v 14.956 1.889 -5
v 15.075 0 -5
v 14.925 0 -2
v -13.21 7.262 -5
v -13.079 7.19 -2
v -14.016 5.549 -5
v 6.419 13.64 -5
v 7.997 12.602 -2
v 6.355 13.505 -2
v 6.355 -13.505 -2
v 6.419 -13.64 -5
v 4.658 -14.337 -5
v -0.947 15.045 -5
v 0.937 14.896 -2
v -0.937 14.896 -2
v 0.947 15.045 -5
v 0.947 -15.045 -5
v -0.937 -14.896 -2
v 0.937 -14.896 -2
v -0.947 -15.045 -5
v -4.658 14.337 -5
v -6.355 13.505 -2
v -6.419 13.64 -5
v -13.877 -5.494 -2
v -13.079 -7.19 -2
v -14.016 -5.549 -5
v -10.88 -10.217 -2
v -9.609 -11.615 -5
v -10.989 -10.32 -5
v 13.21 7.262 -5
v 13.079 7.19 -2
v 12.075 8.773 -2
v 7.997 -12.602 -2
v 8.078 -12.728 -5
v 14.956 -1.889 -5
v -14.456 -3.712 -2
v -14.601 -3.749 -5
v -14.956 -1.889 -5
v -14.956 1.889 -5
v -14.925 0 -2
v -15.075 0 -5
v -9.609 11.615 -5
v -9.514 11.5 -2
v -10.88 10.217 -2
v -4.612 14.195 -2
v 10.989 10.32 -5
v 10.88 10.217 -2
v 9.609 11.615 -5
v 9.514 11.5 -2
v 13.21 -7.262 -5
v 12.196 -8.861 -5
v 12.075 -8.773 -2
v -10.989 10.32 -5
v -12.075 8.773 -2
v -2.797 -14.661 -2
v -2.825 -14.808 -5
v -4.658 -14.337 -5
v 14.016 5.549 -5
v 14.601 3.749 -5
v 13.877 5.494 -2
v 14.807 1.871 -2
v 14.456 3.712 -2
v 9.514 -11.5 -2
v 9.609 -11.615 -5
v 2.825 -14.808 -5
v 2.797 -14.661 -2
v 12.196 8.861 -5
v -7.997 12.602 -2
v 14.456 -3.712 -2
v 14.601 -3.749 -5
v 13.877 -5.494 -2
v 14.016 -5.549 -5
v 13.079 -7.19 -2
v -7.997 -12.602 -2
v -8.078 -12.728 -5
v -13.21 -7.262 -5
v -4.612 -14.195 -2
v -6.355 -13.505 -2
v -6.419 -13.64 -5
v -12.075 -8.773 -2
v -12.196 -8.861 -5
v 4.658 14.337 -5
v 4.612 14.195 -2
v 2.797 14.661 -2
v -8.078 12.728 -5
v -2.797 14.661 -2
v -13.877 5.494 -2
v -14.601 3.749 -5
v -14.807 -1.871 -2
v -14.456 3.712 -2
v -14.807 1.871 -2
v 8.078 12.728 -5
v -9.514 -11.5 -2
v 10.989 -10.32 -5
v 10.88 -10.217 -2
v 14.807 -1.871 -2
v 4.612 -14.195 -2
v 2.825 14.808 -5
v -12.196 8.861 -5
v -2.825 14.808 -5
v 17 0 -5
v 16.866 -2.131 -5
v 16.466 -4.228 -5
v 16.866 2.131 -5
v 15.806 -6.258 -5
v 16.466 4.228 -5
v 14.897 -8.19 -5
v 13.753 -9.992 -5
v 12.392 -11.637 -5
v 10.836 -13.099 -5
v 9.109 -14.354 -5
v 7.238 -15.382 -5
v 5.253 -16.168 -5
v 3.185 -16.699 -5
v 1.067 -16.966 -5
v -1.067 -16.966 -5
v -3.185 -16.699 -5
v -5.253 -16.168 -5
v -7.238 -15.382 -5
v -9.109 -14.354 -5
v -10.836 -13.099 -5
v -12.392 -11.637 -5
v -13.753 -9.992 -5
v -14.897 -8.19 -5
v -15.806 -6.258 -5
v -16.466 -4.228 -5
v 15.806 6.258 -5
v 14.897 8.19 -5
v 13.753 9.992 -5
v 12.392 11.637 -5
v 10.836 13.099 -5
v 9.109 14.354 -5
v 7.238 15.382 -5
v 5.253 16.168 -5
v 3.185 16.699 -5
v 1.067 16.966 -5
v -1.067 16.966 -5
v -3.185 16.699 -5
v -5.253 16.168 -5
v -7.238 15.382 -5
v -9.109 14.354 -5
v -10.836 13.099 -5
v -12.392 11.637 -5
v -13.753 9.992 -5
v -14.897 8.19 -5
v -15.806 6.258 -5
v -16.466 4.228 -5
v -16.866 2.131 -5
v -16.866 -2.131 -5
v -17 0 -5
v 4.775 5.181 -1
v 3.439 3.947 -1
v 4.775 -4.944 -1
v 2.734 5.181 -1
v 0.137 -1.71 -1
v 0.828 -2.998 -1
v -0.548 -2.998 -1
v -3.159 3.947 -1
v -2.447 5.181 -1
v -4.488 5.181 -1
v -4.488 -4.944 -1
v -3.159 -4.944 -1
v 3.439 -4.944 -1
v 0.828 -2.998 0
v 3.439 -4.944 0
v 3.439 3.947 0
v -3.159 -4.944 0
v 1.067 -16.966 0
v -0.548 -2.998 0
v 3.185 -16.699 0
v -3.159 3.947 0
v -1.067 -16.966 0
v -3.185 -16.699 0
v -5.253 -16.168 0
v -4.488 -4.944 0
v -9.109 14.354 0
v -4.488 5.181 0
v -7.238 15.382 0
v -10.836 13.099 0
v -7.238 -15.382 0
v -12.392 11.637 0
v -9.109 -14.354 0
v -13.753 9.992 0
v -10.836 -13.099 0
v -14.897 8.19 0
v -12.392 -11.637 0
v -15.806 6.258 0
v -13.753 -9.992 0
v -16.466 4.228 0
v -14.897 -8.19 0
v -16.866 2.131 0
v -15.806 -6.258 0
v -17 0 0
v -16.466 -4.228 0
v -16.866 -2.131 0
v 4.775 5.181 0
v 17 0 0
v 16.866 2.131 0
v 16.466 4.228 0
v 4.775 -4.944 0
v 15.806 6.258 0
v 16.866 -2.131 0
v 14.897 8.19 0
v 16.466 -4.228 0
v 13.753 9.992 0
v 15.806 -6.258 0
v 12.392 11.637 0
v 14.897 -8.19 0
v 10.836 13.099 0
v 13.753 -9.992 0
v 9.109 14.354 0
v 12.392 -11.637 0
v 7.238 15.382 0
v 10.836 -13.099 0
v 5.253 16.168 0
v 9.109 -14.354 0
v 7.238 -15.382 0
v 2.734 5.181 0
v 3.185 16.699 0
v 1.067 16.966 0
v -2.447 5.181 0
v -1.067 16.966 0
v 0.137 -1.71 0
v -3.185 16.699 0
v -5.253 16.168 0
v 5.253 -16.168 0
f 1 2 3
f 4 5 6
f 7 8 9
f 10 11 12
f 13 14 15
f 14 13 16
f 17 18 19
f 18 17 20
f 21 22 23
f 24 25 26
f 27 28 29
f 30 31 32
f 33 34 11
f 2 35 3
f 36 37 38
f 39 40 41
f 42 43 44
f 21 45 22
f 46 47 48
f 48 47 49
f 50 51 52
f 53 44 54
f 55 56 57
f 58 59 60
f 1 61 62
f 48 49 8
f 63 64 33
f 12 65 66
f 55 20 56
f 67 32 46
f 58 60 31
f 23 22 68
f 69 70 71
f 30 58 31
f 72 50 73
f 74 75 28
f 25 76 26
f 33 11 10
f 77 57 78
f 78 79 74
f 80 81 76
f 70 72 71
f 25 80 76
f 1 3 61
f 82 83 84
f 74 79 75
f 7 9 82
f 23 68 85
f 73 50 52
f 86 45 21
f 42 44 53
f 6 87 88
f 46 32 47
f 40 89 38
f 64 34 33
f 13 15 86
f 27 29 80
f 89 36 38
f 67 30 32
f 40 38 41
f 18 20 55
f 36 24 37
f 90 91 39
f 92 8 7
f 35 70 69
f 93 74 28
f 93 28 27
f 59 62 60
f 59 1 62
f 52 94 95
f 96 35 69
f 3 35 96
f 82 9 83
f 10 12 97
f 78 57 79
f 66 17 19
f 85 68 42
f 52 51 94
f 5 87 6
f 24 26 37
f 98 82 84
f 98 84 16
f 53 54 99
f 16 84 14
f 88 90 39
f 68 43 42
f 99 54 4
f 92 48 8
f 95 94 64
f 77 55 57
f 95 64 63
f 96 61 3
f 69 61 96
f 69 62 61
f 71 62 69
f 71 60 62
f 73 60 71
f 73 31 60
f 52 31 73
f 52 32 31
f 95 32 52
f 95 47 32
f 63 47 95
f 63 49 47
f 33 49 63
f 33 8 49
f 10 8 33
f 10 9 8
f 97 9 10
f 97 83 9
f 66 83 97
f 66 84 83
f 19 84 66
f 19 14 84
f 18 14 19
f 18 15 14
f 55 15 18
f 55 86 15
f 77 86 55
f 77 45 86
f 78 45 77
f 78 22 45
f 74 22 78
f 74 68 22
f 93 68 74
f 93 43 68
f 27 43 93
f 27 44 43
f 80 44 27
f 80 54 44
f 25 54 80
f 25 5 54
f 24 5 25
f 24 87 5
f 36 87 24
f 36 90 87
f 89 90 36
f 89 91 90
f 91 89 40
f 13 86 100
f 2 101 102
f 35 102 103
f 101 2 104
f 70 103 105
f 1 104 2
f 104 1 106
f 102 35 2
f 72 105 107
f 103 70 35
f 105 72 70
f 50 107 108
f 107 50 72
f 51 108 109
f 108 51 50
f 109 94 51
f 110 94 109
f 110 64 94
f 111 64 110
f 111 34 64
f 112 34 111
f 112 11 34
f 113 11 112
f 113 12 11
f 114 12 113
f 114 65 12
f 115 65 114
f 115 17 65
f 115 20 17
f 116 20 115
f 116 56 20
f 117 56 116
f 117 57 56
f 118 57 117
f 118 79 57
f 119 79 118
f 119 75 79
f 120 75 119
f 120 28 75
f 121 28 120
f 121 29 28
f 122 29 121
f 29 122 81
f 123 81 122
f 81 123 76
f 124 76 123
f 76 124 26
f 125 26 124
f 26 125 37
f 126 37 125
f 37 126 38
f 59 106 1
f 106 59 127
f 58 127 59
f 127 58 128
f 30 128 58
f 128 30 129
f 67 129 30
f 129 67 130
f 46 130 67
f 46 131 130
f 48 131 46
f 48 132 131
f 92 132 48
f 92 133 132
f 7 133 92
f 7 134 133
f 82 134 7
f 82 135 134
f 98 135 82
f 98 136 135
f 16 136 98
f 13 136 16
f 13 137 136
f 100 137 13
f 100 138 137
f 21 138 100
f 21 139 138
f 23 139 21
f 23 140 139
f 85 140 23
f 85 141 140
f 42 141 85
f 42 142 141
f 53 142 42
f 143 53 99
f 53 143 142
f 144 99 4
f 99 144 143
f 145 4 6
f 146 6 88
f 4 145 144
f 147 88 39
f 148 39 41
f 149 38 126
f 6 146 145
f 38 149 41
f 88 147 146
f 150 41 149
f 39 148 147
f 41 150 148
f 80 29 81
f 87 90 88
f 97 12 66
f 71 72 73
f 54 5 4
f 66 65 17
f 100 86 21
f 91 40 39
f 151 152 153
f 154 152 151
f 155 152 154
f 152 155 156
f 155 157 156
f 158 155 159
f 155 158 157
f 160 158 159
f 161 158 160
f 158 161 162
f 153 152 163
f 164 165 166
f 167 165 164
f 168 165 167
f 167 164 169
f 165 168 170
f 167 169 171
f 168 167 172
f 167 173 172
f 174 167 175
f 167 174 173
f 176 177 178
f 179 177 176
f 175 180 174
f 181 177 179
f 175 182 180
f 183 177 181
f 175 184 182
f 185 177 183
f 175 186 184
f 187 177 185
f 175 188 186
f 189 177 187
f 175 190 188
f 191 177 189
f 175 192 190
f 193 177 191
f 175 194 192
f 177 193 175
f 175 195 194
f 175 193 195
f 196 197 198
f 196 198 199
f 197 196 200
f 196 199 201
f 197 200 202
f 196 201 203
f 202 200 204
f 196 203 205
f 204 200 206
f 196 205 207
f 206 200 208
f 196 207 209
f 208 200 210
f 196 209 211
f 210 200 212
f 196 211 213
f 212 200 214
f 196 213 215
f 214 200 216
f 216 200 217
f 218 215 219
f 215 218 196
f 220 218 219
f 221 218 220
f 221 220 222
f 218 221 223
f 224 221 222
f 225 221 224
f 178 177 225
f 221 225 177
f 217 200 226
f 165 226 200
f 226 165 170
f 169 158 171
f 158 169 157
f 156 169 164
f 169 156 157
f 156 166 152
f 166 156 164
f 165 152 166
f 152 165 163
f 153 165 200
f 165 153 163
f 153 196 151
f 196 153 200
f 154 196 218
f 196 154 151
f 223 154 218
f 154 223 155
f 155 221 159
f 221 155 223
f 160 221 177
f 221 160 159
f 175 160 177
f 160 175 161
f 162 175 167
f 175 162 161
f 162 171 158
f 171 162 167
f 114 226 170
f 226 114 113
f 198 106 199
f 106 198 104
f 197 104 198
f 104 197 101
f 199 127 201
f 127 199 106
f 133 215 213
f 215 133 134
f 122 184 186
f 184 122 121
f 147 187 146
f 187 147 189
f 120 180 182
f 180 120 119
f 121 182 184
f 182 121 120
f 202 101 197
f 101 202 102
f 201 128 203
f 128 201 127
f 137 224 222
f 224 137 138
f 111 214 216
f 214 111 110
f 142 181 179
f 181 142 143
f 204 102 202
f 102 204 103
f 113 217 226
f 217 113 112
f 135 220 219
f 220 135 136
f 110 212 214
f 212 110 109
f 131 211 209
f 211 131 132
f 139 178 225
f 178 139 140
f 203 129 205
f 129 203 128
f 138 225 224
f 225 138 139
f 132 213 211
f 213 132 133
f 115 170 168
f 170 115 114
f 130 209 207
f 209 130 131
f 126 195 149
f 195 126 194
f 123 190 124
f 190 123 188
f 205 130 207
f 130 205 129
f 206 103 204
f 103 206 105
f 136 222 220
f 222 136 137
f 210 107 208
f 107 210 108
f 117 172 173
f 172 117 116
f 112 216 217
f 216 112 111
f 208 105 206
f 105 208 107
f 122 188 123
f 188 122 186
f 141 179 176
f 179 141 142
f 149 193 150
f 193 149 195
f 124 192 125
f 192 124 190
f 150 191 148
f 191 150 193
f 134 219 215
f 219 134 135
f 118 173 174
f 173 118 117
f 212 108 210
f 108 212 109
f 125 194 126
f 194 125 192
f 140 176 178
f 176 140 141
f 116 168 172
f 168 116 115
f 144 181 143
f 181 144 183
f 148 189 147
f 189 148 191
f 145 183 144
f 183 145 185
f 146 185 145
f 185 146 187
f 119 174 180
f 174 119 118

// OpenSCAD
$fn = 50;


difference() {
	union() {
		translate(v = [0, 0, -5.0000000000]) {
			cylinder(h = 5, r = 17.0000000000);
		}
	}
	union() {
		#translate(v = [0, 0, -5.0000000000]) {
			cylinder(h = 3, r1 = 15.0750000000, r2 = 14.9250000000);
		}
		translate(v = [0, 0, -1]) {
			linear_extrude(height = 1) {
				text(font = "Impact", halign = "center", size = 10, text = "M", valign = "center");
			}
		}
	}
}
